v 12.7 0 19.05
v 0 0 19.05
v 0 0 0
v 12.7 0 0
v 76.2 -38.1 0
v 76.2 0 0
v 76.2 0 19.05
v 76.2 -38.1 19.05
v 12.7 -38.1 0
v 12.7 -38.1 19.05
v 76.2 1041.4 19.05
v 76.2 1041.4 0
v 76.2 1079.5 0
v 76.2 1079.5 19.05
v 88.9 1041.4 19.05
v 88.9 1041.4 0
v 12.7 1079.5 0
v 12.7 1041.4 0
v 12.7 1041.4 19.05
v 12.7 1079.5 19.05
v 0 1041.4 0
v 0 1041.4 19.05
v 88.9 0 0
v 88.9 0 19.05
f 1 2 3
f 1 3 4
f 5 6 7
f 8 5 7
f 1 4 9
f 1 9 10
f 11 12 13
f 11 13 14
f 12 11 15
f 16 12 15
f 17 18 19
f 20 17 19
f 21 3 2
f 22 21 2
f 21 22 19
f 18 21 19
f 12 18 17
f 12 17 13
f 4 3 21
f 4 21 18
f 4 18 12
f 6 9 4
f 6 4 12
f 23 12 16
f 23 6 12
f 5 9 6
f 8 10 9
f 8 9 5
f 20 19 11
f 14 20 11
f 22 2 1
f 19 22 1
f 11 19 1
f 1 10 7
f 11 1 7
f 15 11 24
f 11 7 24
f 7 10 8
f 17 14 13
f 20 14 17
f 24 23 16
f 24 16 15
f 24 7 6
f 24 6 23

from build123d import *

# Parameters (mm, degrees)
F0_W     = 88.9
F0_H     = 19.05
F1_DEPTH = 1041.4
F2_W     = 63.5
F2_H     = 19.05
F3_DEPTH = 38.1
F4_W     = 63.5
F4_H     = 19.05
F5_DEPTH = 38.1


with BuildPart() as f1:
    # F0 (on Front) → F1 (new body)
    with BuildSketch(Plane.XZ):
        with Locations((44.45, 9.525)):
            Rectangle(F0_W, F0_H)
    extrude(amount=-F1_DEPTH)

    # F2 (on face) → F3 (join)
    with BuildSketch(Plane.XZ):
        with Locations((44.45, 9.525)):
            Rectangle(F2_W, F2_H)
    extrude(amount=F3_DEPTH)

    # F4 (on face) → F5 (join)
    with BuildSketch(Plane(origin=(0, 1041.4, 0), x_dir=(-1, 0, 0), z_dir=(0, 1, 0))):
        with Locations((-44.45, 9.525)):
            Rectangle(F4_W, F4_H)
    extrude(amount=F5_DEPTH)


solid = f1.part
